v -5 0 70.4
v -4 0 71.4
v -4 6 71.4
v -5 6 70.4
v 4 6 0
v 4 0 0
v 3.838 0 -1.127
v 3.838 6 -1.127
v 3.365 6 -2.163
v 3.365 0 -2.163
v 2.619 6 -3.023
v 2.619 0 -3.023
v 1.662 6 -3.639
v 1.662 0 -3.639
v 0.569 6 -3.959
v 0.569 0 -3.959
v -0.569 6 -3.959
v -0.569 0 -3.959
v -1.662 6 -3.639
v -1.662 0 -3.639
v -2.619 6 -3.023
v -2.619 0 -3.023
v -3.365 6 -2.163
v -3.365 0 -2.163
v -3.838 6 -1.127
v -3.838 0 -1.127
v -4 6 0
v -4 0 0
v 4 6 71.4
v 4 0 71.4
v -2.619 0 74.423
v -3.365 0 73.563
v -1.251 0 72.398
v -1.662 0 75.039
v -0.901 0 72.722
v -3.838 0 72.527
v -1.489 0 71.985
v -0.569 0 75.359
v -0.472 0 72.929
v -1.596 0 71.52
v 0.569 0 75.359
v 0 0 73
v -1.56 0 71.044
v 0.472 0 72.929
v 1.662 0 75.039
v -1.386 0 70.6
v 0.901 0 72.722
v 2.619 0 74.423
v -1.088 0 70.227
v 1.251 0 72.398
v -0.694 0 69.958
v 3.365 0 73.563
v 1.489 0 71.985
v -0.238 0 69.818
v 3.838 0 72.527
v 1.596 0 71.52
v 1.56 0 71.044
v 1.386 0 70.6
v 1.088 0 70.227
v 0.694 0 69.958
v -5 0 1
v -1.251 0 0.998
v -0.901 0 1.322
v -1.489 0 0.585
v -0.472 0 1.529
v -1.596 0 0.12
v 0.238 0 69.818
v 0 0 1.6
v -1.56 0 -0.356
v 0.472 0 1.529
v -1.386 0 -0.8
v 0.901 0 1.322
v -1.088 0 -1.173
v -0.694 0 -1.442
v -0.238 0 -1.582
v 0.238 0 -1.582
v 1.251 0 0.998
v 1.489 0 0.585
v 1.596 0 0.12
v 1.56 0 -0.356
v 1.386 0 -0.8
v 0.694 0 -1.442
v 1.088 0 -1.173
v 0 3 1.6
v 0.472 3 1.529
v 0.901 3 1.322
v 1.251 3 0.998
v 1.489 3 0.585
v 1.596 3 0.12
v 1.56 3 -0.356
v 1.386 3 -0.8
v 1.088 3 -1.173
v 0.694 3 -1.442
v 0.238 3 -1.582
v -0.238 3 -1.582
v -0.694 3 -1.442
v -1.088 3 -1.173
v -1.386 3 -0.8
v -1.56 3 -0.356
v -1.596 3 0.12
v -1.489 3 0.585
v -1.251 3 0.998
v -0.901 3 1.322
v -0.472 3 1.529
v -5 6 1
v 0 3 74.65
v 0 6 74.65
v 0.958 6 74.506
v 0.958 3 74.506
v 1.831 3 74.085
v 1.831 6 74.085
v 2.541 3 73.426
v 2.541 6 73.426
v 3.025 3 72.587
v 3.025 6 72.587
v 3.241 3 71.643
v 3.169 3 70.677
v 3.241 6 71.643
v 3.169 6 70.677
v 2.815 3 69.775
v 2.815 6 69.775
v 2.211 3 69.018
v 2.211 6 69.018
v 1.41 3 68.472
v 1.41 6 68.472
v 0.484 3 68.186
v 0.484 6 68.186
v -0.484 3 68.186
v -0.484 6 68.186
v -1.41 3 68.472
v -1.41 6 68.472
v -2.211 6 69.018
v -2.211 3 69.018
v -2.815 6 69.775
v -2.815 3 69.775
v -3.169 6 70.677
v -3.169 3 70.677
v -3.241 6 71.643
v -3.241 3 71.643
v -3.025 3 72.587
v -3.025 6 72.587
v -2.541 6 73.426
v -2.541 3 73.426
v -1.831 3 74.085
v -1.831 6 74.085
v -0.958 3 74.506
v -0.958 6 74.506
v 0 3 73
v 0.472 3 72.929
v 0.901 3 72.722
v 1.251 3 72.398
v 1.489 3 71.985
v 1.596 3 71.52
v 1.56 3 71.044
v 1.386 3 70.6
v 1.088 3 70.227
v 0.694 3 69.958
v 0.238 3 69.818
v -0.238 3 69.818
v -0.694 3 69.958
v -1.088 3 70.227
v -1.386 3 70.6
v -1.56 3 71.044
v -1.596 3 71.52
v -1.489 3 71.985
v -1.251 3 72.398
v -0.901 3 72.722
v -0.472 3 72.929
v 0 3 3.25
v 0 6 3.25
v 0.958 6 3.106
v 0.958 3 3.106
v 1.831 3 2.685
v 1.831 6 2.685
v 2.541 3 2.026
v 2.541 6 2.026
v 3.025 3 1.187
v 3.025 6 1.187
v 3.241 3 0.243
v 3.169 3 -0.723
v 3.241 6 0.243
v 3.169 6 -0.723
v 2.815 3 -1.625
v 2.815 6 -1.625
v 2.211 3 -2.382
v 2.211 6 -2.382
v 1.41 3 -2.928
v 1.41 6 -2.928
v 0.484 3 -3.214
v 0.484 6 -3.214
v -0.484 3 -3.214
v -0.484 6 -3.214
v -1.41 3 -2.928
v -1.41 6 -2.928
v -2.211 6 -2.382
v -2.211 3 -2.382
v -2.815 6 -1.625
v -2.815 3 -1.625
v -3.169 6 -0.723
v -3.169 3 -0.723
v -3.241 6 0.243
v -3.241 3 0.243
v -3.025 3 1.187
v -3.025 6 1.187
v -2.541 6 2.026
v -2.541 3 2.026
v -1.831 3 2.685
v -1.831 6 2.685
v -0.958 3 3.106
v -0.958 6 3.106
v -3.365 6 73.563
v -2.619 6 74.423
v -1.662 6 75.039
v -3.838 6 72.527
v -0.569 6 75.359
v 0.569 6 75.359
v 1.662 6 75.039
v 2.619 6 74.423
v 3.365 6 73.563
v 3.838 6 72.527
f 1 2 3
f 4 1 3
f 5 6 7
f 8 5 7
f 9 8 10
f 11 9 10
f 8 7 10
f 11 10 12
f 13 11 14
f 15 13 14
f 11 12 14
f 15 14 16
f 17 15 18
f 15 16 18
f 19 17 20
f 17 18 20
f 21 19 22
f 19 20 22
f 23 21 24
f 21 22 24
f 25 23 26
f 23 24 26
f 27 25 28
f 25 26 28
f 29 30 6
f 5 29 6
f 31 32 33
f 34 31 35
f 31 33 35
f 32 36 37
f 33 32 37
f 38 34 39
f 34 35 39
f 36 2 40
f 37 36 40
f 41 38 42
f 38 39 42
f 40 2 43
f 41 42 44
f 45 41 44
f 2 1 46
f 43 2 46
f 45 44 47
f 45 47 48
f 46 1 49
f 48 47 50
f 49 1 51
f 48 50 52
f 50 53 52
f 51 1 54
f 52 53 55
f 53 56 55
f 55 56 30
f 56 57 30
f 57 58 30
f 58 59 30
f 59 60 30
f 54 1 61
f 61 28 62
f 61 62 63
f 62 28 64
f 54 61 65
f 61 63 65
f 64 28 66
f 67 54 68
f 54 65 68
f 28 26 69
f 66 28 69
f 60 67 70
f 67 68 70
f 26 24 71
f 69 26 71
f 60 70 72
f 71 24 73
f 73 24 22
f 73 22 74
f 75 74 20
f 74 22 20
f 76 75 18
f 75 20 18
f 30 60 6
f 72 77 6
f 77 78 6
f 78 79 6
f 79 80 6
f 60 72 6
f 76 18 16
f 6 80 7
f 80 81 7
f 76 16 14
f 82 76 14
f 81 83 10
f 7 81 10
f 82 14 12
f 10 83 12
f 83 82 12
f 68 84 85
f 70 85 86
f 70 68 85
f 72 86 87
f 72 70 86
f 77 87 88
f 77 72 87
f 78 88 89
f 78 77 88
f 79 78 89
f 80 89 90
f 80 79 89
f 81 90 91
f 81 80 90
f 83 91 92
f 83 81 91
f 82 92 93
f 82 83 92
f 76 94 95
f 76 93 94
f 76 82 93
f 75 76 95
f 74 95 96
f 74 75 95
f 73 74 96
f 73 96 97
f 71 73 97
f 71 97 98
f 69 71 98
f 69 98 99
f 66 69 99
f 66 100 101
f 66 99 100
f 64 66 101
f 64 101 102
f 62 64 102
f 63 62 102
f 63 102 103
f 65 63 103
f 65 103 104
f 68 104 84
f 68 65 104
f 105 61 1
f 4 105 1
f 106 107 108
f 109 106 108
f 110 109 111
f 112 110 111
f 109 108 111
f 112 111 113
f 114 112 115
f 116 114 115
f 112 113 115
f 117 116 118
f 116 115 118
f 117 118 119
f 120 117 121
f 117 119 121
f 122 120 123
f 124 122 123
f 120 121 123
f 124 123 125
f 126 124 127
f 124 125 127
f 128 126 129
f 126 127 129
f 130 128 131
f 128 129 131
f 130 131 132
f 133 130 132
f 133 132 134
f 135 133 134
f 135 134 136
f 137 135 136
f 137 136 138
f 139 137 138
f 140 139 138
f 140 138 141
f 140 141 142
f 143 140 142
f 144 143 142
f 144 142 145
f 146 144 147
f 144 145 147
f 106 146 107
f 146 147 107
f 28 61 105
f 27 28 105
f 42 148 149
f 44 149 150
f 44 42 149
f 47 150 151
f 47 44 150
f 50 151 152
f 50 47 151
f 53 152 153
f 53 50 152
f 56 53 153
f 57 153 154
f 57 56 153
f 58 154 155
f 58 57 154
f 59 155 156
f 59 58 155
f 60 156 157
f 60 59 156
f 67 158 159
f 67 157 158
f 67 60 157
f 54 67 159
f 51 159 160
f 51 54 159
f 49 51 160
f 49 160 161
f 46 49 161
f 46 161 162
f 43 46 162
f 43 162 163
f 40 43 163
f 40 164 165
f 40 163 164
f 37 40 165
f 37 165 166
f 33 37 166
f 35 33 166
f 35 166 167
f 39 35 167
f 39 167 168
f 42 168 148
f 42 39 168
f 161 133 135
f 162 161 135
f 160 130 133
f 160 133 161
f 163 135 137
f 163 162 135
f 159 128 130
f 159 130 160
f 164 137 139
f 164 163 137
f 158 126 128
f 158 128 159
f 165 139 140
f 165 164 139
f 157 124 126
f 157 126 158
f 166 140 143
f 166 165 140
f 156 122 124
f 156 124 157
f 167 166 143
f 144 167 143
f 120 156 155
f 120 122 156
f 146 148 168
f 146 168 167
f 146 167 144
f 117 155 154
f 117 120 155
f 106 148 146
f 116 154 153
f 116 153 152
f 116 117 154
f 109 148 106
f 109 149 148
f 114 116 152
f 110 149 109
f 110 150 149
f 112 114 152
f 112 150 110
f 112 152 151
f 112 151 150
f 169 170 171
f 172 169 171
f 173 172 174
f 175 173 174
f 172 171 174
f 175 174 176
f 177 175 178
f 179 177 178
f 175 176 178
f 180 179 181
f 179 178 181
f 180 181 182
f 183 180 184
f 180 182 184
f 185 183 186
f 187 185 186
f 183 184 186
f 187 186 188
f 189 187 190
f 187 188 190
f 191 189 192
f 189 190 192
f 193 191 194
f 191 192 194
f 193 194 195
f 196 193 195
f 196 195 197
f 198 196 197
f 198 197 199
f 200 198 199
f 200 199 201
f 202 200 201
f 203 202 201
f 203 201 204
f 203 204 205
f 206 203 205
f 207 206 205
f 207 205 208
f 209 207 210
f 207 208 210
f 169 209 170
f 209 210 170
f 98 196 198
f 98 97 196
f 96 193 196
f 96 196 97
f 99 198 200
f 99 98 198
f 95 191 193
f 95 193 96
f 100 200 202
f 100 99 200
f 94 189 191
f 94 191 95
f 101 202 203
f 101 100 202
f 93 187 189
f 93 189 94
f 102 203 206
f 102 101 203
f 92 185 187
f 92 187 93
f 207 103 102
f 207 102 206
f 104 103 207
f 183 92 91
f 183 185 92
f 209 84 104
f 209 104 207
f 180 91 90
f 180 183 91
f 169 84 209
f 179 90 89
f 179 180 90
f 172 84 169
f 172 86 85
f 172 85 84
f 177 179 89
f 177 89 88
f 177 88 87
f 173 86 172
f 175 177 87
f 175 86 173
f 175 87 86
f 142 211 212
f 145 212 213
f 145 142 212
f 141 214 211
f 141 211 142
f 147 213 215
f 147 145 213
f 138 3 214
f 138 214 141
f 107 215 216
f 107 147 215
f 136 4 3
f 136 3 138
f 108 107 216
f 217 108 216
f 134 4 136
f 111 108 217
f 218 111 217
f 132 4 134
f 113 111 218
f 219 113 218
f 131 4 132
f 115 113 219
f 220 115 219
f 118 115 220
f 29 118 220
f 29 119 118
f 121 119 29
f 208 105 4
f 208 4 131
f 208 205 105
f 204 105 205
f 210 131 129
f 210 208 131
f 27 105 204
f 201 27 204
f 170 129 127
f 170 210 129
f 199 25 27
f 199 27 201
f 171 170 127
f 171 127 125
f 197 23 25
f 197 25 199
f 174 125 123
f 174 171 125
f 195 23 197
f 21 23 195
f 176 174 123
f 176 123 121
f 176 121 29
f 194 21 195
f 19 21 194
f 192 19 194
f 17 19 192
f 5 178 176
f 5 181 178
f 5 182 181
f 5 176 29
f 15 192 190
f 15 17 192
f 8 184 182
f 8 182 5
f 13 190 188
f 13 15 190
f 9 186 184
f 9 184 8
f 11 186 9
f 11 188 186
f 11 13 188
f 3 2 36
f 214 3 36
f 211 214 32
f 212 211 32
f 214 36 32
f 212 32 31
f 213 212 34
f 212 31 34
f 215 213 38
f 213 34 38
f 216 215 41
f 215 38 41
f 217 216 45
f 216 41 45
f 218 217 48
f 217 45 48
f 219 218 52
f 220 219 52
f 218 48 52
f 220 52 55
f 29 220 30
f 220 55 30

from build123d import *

# Parameters (mm, degrees)
SKETCH_1_R          = 1.6
SKETCH_1_R_2        = 1.6000000000000016
EXTRUDE_1_DEPTH     = 6
CHAMFER_1_SIZE      = 1
SKETCH_2_R          = 3.25
SKETCH_2_R_2        = 3.250000000000001
CUT_EXTRUDE_1_DEPTH = 3


with BuildPart() as part:
    # Эскиз1 → Бобышка-Вытянуть1 (new body)
    with BuildSketch(Plane(origin=(0, 0, 0), x_dir=(1, 0, 0), z_dir=(0, 1, 0))):
        with BuildLine():
            Line((-4, -9.8e-16), (-5.000000000000001, -1.1e-15))
            Line((-5.000000000000001, -1.1e-15), (-4.999999999999991, -71.4))
            Line((-4.999999999999991, -71.4), (-4.000000000000001, -71.4))
            ThreePointArc((-4.000000000000001, -71.4), (-7.3e-16, -75.4), (4, -71.4))
            Line((4, -71.4), (4, 0))
            ThreePointArc((4, 0), (2.4e-16, 4), (-4, -9.8e-16))
        make_face()
        with Locations(Location((0, 0, 0), (0, 0, 270))):
            Circle(SKETCH_1_R, mode=Mode.SUBTRACT)
        with Locations(Location((0, -71.4, 0), (0, 0, 270))):
            Circle(SKETCH_1_R_2, mode=Mode.SUBTRACT)
    extrude(amount=EXTRUDE_1_DEPTH)

    # Фаска1
    chamfer_1_edges = [part.edges().sort_by_distance(p)[0] for p in [
        (-5.000000000000001, 3, 1.1e-15),
        (-4.999999999999991, 3, 71.4),
    ]]
    chamfer(chamfer_1_edges, length=CHAMFER_1_SIZE - 0.0001)  # a hair under: the kernel refuses the full size

    # Эскиз2 → Вырез-Вытянуть1 (cut)
    with BuildSketch(Plane(origin=(0, 6, 0), x_dir=(1, 0, 0), z_dir=(0, 1, 0))):
        with Locations(Location((0, 0, 0), (0, 0, 270))):
            Circle(SKETCH_2_R)
        with Locations(Location((0, -71.4, 0), (0, 0, 270))):
            Circle(SKETCH_2_R_2)
    extrude(amount=-CUT_EXTRUDE_1_DEPTH, mode=Mode.SUBTRACT)


solid = part.part
